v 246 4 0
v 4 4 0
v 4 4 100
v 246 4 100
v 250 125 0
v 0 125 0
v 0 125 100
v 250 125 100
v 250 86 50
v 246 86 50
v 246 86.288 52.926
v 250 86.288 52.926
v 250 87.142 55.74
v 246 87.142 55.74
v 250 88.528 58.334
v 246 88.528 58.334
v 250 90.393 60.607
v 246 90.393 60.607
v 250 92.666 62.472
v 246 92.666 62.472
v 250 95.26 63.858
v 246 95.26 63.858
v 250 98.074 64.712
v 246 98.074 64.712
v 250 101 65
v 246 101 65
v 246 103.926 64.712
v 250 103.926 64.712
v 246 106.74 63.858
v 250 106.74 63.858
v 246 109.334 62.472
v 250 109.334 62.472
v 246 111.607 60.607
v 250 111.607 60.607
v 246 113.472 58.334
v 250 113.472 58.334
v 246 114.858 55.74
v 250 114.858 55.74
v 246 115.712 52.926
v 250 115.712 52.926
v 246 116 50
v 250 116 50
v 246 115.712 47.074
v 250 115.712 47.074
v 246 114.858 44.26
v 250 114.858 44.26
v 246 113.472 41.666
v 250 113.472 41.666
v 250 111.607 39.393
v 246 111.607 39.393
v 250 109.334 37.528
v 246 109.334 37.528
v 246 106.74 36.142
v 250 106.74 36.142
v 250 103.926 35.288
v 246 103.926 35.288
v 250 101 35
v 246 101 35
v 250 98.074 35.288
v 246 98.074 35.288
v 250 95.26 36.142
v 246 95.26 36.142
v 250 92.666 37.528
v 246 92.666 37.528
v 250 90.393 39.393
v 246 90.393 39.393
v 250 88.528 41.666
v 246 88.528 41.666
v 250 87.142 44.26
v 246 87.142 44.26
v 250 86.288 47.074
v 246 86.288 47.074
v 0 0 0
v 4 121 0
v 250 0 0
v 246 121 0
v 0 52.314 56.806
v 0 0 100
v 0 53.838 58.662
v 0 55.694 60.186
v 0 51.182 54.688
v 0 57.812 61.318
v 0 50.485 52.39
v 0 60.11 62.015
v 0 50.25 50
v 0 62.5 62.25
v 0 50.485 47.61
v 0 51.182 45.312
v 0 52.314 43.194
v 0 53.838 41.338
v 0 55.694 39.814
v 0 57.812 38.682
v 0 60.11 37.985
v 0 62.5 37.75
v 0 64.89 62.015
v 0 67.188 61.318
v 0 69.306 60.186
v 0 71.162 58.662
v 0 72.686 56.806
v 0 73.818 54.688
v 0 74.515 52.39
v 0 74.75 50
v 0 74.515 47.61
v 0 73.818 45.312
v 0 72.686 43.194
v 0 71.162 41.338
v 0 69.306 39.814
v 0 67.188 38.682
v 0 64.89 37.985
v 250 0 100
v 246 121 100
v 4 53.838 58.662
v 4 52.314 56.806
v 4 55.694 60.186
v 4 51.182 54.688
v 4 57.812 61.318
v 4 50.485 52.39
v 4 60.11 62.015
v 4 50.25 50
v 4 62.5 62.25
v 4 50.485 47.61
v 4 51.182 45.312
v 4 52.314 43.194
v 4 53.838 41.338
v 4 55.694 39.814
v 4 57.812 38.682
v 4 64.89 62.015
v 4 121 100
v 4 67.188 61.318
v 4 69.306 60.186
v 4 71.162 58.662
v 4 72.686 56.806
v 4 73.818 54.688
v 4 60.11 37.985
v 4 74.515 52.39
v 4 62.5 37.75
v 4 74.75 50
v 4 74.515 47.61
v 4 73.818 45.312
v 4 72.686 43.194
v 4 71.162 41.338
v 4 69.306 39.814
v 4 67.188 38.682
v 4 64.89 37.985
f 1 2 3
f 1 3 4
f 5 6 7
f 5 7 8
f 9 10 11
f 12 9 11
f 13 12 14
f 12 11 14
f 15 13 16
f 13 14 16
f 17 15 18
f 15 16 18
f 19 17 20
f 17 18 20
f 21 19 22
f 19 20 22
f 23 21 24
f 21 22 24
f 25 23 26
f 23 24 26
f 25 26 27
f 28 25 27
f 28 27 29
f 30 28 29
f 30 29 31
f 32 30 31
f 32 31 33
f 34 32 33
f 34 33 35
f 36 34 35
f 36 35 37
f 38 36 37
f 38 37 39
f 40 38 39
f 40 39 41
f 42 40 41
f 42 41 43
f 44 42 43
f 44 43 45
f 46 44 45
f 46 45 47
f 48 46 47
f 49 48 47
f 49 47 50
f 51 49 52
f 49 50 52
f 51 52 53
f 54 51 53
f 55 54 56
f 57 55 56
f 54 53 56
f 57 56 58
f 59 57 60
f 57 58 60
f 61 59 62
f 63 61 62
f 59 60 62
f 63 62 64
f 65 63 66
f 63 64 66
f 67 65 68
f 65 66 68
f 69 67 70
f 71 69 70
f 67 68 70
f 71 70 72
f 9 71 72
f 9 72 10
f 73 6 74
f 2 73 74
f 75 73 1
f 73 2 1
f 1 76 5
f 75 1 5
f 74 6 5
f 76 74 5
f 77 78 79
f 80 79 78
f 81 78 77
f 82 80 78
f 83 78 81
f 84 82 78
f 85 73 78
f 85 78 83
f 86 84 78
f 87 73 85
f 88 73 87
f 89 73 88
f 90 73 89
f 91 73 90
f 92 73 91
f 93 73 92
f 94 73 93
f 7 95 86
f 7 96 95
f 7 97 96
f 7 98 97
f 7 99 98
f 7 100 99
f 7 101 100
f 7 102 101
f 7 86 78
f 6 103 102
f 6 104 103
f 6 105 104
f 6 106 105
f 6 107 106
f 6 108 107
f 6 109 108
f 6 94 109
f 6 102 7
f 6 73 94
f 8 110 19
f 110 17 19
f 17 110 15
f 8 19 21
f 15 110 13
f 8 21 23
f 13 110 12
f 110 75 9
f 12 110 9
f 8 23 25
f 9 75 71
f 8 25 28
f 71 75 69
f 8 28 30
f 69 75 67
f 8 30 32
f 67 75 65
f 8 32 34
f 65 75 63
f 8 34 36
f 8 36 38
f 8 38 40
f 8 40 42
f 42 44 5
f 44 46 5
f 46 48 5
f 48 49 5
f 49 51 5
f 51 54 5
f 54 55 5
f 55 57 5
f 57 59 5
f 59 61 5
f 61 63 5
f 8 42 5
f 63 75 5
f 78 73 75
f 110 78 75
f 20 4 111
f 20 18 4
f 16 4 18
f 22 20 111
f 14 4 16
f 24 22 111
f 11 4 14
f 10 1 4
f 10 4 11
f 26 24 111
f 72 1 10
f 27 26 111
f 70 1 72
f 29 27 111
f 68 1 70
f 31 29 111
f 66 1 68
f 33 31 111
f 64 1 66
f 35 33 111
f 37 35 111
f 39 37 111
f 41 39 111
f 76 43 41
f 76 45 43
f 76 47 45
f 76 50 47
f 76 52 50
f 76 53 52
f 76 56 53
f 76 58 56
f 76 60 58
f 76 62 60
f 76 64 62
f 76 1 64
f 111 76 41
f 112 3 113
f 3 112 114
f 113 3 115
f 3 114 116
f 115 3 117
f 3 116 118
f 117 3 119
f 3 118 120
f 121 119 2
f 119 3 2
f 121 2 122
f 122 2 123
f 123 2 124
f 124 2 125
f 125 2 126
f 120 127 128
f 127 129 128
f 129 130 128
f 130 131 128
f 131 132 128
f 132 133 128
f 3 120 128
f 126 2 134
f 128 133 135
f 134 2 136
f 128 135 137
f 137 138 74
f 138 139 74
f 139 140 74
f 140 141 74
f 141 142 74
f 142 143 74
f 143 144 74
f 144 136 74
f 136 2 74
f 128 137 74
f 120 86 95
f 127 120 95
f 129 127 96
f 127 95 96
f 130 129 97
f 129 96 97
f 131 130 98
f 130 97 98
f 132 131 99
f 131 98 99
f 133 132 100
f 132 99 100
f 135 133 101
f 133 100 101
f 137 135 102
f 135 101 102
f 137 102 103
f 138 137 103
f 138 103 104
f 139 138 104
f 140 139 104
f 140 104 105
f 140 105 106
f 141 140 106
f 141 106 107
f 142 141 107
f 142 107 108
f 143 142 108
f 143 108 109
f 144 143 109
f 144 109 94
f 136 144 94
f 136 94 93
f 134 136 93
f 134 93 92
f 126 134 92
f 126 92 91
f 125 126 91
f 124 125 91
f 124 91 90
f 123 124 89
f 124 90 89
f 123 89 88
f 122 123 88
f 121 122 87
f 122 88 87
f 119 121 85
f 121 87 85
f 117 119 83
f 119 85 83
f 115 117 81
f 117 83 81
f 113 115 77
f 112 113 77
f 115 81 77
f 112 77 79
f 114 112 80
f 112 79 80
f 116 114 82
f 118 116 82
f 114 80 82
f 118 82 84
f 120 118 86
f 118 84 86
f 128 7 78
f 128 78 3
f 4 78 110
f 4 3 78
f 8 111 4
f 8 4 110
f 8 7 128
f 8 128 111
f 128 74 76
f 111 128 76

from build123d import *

# Parameters (mm, degrees)
SKIZZE1_W                       = 250
SKIZZE1_H                       = 125
SKIZZE1_W_2                     = 242
SKIZZE1_H_2                     = 117
AUFSATZ_LINEAR_AUSTRAGEN1_DEPTH = 100
SKIZZE2_R                       = 12.25
SCHNITT_LINEAR_AUSTRAGEN1_DEPTH = 10
SKIZZE3_R                       = 15
SCHNITT_LINEAR_AUSTRAGEN2_DEPTH = 10


with BuildPart() as part:
    # Skizze1 → Aufsatz-Linear austragen1 (new body)
    with BuildSketch(Plane.XY):
        with Locations((125, 62.5)):
            Rectangle(SKIZZE1_W, SKIZZE1_H)
        with Locations((125, 62.5)):
            Rectangle(SKIZZE1_W_2, SKIZZE1_H_2, mode=Mode.SUBTRACT)
    extrude(amount=AUFSATZ_LINEAR_AUSTRAGEN1_DEPTH)

    # Skizze2 → Schnitt-Linear austragen1 (cut)
    with BuildSketch(Plane.ZY):
        with Locations((50, 62.5)):
            Circle(SKIZZE2_R)
    extrude(amount=-SCHNITT_LINEAR_AUSTRAGEN1_DEPTH, mode=Mode.SUBTRACT)

    # Skizze3 → Schnitt-Linear austragen2 (cut)
    with BuildSketch(Plane.ZY.offset(-246)):
        with Locations(Location((50, 101, 0), (0, 0, 270))):
            Circle(SKIZZE3_R)
    extrude(amount=-SCHNITT_LINEAR_AUSTRAGEN2_DEPTH, mode=Mode.SUBTRACT)


solid = part.part
